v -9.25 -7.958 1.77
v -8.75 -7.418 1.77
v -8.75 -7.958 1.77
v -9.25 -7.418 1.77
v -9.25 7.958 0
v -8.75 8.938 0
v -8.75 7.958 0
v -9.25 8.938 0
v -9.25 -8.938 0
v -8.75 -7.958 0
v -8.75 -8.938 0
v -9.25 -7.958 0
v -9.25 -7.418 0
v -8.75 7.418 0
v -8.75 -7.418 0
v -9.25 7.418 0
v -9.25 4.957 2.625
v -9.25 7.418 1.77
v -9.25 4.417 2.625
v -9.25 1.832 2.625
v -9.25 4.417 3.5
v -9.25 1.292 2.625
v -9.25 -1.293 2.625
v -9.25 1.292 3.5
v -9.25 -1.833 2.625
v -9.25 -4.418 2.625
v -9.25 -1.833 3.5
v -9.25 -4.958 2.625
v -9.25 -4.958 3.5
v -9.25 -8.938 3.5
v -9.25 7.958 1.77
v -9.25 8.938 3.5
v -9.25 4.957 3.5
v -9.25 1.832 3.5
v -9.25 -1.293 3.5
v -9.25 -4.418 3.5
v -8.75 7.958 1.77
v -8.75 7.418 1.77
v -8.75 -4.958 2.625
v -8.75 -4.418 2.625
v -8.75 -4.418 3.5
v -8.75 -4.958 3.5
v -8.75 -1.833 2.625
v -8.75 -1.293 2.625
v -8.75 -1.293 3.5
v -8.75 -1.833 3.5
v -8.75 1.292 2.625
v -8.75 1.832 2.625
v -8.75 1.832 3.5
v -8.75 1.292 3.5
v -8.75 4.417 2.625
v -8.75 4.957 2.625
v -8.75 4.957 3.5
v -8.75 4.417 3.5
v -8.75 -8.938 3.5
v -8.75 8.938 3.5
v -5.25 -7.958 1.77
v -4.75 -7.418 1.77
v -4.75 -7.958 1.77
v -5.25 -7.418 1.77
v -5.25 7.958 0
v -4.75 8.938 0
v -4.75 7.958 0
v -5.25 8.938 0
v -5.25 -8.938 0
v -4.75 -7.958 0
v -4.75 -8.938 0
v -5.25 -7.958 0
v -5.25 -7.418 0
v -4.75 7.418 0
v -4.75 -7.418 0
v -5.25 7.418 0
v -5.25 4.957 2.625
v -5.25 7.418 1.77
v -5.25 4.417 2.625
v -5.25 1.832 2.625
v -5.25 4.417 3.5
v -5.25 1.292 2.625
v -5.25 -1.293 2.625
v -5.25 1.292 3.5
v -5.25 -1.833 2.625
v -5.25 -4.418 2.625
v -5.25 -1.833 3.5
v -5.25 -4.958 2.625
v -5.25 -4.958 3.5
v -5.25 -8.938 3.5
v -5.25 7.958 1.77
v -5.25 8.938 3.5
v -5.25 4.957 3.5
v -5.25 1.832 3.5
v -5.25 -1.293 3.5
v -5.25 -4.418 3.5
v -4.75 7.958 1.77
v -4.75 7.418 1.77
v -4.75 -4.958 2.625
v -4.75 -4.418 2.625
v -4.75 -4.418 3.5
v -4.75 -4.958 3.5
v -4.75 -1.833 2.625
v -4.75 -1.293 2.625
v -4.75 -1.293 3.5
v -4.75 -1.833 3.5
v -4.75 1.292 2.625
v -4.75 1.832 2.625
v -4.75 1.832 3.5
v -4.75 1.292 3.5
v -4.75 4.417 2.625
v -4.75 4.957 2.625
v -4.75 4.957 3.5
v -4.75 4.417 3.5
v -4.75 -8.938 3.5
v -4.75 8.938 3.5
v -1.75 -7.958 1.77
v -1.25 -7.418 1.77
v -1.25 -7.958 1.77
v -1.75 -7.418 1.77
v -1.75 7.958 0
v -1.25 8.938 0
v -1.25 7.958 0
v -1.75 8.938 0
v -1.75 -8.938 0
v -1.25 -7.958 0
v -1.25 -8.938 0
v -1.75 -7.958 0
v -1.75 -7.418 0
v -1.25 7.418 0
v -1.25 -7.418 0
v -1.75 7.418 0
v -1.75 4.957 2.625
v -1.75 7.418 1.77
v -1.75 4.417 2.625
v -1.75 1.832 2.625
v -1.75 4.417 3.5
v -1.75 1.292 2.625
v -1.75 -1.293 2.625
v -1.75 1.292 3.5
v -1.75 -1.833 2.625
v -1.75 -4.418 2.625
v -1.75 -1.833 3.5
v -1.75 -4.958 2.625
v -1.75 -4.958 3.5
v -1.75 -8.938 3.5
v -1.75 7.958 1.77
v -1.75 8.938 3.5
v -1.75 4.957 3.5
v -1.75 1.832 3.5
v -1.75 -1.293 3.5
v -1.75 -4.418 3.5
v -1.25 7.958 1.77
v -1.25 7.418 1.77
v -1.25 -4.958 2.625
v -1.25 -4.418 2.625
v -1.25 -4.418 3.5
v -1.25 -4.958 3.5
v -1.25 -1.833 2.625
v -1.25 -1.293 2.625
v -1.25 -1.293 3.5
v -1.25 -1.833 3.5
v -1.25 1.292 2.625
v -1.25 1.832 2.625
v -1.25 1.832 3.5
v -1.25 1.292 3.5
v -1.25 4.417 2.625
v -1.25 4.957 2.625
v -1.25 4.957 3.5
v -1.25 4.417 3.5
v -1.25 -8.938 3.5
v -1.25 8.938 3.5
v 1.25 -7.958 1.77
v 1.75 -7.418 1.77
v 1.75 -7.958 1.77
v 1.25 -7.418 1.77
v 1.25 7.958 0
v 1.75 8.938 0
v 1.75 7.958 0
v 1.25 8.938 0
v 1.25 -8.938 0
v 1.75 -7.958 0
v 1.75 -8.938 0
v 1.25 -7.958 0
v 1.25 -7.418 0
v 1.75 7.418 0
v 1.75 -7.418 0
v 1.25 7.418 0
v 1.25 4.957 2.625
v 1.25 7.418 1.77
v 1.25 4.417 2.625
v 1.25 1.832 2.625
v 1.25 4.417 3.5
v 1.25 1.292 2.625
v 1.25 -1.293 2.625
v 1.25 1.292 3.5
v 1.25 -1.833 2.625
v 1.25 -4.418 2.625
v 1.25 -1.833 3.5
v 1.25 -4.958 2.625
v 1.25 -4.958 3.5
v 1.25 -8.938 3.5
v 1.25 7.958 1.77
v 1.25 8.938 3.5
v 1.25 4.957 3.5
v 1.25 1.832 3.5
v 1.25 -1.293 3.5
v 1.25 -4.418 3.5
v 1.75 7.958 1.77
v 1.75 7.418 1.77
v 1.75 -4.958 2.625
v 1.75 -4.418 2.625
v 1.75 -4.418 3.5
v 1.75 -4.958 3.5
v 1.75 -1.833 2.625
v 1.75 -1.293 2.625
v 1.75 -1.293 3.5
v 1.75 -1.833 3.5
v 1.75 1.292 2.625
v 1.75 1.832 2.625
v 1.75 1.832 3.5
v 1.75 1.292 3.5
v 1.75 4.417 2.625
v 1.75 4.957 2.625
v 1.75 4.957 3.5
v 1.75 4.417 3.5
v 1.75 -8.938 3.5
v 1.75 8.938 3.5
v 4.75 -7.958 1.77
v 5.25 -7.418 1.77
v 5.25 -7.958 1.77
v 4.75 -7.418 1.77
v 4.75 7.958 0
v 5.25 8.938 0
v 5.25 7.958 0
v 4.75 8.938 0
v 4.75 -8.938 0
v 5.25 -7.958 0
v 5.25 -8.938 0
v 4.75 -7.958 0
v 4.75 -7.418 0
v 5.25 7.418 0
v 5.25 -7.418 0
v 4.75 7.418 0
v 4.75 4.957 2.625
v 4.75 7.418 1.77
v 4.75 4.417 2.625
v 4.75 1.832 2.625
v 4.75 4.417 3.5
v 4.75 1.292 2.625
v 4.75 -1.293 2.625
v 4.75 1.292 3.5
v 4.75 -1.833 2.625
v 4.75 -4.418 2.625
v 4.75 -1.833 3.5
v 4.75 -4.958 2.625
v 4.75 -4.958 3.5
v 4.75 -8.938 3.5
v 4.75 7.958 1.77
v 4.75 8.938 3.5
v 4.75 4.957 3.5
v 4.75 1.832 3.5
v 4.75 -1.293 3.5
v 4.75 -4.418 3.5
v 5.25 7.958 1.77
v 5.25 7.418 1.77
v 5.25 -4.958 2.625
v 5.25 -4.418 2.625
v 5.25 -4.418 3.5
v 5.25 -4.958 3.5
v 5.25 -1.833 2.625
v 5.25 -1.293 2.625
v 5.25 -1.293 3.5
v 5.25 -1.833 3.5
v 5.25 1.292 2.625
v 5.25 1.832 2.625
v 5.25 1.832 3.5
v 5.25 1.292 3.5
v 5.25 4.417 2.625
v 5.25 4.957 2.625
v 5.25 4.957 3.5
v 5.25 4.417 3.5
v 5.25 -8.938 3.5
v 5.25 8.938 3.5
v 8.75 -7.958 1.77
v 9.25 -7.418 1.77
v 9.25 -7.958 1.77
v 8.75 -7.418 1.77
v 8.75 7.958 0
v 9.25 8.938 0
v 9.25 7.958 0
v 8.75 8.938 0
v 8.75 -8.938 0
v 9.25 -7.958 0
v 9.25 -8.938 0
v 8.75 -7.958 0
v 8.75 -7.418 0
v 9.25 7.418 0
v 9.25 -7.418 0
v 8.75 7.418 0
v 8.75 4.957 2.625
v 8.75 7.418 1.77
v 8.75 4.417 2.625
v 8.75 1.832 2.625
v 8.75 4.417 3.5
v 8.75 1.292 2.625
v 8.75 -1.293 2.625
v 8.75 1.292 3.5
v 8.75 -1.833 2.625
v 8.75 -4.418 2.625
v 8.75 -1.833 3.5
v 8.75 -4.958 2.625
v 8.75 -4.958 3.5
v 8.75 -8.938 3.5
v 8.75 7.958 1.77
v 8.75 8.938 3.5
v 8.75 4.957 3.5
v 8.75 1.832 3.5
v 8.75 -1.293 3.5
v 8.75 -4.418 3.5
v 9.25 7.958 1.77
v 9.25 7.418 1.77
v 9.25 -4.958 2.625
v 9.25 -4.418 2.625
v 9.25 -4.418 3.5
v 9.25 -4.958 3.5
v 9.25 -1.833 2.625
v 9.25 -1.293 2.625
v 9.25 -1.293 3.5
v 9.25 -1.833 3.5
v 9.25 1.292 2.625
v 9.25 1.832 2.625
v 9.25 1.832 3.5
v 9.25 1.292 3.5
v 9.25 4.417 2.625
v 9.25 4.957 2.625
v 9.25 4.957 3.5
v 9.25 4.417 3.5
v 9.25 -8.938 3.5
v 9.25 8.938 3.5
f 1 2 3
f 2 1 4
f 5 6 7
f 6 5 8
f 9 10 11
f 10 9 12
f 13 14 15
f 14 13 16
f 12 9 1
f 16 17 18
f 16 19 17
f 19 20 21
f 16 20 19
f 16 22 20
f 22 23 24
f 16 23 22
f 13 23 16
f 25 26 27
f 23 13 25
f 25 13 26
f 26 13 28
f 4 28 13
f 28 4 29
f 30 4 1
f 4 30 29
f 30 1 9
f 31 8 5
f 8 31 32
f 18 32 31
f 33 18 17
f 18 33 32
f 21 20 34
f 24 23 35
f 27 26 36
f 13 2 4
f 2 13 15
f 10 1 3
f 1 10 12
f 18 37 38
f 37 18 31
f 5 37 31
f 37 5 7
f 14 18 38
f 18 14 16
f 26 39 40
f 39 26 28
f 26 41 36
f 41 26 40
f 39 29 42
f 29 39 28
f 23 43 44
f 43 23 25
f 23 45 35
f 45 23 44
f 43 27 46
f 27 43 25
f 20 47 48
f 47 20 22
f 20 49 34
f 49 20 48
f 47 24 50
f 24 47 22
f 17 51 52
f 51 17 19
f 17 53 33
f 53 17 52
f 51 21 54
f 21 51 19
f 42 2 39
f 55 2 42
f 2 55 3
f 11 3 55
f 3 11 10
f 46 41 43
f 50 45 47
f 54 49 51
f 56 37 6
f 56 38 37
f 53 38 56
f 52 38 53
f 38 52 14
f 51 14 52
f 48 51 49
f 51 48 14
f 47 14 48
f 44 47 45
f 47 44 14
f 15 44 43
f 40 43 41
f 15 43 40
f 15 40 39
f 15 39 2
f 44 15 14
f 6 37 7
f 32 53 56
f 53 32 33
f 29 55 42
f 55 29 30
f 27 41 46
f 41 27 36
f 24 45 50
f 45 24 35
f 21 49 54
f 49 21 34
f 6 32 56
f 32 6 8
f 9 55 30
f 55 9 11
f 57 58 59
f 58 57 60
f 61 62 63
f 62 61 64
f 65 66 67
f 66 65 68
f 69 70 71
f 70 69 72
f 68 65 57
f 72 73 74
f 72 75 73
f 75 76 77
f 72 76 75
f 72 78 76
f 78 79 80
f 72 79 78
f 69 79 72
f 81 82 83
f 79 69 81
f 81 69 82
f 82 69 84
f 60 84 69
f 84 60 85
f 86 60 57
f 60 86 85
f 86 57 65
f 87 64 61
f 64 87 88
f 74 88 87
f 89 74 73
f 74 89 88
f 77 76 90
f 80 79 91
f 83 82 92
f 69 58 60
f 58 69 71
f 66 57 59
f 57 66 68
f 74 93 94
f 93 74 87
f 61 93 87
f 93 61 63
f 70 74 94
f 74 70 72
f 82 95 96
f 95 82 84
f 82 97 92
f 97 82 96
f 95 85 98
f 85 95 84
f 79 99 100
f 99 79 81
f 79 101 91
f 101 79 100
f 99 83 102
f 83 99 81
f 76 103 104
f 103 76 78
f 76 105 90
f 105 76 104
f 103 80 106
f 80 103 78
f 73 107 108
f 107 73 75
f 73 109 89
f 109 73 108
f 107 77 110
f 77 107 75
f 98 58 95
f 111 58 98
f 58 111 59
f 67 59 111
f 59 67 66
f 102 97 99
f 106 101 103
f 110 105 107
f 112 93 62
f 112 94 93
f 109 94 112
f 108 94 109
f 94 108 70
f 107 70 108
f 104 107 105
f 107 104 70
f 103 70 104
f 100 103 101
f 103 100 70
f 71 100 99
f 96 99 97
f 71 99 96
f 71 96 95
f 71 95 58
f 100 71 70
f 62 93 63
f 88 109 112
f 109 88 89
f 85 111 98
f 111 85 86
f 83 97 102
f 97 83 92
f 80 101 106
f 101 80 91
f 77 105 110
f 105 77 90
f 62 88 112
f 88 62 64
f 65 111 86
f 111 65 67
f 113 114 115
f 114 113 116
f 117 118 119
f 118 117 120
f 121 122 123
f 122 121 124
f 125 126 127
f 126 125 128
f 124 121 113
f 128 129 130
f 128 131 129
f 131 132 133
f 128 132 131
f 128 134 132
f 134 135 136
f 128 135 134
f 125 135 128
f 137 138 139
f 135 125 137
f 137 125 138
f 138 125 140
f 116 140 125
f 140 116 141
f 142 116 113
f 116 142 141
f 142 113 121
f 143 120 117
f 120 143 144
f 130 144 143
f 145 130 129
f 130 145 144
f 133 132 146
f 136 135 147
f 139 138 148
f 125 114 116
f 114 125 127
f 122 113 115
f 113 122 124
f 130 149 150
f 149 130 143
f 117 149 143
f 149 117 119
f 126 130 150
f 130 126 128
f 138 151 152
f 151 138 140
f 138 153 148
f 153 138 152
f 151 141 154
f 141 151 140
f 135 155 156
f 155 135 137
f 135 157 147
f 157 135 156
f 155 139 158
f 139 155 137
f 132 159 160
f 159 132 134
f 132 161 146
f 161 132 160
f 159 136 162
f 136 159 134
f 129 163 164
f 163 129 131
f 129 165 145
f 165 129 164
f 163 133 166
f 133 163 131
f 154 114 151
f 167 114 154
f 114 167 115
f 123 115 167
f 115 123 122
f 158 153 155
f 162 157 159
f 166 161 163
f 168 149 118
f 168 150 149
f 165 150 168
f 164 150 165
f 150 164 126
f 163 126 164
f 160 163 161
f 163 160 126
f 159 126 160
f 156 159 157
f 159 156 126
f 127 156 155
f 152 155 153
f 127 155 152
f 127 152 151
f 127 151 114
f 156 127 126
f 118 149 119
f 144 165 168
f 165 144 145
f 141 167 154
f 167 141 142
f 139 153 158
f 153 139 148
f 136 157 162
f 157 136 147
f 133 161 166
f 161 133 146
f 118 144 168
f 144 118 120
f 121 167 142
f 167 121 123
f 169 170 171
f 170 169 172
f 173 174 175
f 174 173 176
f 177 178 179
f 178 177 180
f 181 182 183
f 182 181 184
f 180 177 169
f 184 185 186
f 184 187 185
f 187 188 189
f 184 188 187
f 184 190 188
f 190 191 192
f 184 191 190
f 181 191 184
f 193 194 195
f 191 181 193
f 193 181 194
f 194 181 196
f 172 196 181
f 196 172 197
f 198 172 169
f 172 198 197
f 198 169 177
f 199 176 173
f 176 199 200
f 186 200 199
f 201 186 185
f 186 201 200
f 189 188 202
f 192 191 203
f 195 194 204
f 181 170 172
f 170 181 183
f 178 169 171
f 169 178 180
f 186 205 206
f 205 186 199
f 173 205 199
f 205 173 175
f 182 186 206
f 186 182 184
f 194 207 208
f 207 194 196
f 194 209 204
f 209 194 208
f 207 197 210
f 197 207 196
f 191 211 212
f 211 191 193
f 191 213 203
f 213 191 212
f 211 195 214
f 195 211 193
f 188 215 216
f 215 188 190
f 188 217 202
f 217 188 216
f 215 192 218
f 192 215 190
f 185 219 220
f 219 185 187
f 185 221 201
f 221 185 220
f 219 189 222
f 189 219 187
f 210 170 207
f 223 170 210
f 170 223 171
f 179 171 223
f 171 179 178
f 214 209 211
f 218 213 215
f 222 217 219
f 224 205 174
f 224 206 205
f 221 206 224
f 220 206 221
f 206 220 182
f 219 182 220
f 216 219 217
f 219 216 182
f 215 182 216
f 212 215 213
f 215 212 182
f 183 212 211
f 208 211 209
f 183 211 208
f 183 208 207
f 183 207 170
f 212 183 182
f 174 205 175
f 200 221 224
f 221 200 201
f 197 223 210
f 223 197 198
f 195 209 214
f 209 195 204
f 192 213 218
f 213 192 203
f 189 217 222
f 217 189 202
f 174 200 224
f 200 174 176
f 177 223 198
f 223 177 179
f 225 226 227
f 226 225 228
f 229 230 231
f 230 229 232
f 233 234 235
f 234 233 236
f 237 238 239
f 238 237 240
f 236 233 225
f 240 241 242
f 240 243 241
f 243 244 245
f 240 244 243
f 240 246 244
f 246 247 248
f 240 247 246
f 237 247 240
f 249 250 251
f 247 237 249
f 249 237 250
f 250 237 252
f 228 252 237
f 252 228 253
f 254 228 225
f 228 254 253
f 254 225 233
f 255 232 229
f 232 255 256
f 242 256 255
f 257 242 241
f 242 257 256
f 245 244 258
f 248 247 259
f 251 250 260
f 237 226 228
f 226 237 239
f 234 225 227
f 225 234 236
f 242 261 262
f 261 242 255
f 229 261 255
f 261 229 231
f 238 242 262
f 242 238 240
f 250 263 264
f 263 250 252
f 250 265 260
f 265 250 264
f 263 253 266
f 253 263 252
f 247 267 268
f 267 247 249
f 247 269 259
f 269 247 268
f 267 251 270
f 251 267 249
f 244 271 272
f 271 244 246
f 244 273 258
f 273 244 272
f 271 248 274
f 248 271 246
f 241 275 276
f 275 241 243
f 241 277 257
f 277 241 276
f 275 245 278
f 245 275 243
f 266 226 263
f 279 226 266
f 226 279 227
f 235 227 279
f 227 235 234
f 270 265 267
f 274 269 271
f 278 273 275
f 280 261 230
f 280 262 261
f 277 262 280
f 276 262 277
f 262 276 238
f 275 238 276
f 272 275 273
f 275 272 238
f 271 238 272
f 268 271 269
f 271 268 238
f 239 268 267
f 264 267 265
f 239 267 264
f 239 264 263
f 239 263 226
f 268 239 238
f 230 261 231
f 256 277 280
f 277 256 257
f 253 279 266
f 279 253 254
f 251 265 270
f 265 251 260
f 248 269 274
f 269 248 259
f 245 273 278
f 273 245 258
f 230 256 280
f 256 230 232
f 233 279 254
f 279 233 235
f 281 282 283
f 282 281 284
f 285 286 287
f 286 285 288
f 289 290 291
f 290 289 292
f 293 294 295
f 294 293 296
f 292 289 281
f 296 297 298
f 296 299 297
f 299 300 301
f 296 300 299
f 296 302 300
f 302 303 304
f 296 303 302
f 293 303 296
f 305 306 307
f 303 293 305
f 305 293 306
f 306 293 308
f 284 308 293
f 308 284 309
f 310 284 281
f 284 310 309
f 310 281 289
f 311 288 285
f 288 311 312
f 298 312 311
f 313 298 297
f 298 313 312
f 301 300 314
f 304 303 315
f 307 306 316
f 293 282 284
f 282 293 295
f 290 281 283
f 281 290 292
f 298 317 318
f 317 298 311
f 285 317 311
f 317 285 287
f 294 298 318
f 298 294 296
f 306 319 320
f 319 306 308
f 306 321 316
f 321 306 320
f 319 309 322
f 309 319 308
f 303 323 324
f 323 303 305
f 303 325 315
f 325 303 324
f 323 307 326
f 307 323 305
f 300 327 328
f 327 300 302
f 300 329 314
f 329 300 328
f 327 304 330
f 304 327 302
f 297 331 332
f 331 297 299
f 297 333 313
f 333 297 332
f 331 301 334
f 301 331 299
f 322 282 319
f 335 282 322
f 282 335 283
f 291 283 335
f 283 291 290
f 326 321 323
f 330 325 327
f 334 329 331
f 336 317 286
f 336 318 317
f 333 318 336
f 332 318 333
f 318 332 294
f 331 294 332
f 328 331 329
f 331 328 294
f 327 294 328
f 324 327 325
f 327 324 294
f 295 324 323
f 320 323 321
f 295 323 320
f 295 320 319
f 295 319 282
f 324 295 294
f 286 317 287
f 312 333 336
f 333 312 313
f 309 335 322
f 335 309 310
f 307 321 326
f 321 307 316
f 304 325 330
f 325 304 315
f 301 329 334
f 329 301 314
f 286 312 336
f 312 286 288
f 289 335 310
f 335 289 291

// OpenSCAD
// file: layout.scad
// Rack layout geometry. Include config.scad once before this file.
// Functions are ordered so each name is defined before use (OpenSCAD 2021).

function rack_center_x() = 0;
function rack_center_y() = 0;

function x_divider_center_x(i) =
  rack_center_x() + divider_offset_from_center_in[i];

function divider_inner_left_x() =
  x_divider_center_x(0) + wall_thickness_in / 2;
function divider_inner_right_x() =
  x_divider_center_x(num_rows) - wall_thickness_in / 2;

function end_wall_inner_front_y() =
  rack_center_y() + end_wall_inner_offset_from_center_y[0];
function end_wall_inner_back_y() =
  rack_center_y() + end_wall_inner_offset_from_center_y[1];

function footprint_d_in() = max(
  end_wall_inner_back_y() - end_wall_inner_front_y(),
  (tubes_per_row - 1) * row_depth_in + tube_od_in
);

function layout_half_span_in() =
  max(
    max([for (i = [0 : num_rows - 1]) abs(column_tube_offset_from_center_in[i])])
      + tube_od_in / 2,
    max([for (i = [0 : num_rows]) abs(divider_offset_from_center_in[i])])
      + wall_thickness_in / 2
  );

function end_wall_w_in() =
  x_divider_center_x(num_rows) - x_divider_center_x(0) + wall_thickness_in
    + 2 * end_wall_extension_in;
function end_wall_x0() =
  x_divider_center_x(0) - wall_thickness_in / 2 - end_wall_extension_in;
function end_wall_height_in() = wall_height_in;

function tube_center_y(col_i) =
  rack_center_y() + depth_tube_offset_from_center_in[col_i];

function column_board_length_in() = footprint_d_in() + column_board_extension_in;
function column_board_y0() =
  rack_center_y() - column_board_length_in() / 2;
function board_half_lap_z_in() = wall_height_in / 2;

function num_middle_row_dividers() = tubes_per_row - 1;

function middle_row_divider_center_y(i) =
  rack_center_y()
    + (depth_tube_offset_from_center_in[i]
      + depth_tube_offset_from_center_in[i + 1])
      / 2;

function middle_row_z0_in() = board_half_lap_z_in();
function middle_row_height_in() = wall_height_in;
function middle_row_half_lap_z_in() = middle_row_height_in() / 2;
// Lap in the column upper band (overlap with column is only wall_height - z0).
function column_middle_row_notch_z0() =
  middle_row_z0_in() + (wall_height_in - middle_row_z0_in()) / 2;
function column_middle_row_notch_h_in() =
  (wall_height_in - middle_row_z0_in()) / 2;
function row_board_middle_w_in() = end_wall_w_in();
function row_board_middle_x0() = end_wall_x0();

function footprint_w_in() = max(
  divider_inner_right_x() - divider_inner_left_x(),
  2 * (layout_half_span_in() + tilt_pad_x_in)
);

function bay_center_x(row_i) =
  rack_center_x() + column_tube_offset_from_center_in[row_i];

function divider_clear_span_x(bay_i) =
  divider_offset_from_center_in[bay_i + 1]
    - divider_offset_from_center_in[bay_i]
    - wall_thickness_in;

// --- Top dowels (middle + inner primitives; rack.scad places num_row_dowels_top copies) ---
function dowel_layer_z0_in() =
  middle_row_z0_in() + middle_row_height_in() + dowel_above_middle_row_in;

function row_dowel_length_y_in() = column_board_length_in();

function row_dowel_od_at(i) = row_dowel_od_in[i];

function row_dowel_center_z_in(i) = dowel_layer_z0_in() + row_dowel_od_at(i) / 2;

function row_dowel_placement_x(i) =
  rack_center_x() + row_dowel_x_offset_from_center_in[i];

function row_dowel_tube_column(i) = row_dowel_tube_column_i[i];
// file: config.scad
// Finale mortar rack — shared parameters (inches unless noted)

// --- Tubes (inventory) ---
tube_od_in = 2.375;
tube_length_in = 12;
shell_nominal_in = 2; // Class C 2 in. mortars

// --- Layout ---
num_rows = 5;
tubes_per_row = 5; // 5×5 per rack × 2 racks = 50 tubes (Commander finale)
num_dividers_x = num_rows + 1; // 6 green boards: left side + 4 between columns + right side
board_thickness_in = 0.5;
tube_gap_in = 0.25; // extra clearance inside each cell
row_spacing_in = tube_od_in + board_thickness_in + tube_gap_in;
row_depth_in = tube_od_in + board_thickness_in + tube_gap_in;

// --- Column layout (+X = right, from rack center) ---
column_tube_offset_from_center_in = [
  -6.5, // 0 outer left
  -3, // 1 middle left
  0,      // 2 center
  3,  // 3 middle right
  6.5,  // 4 outer right
];
divider_offset_from_center_in = [
  -9,     // 0 left side (outer)
  -5,     // 1 outer left | middle left
  -1.5,   // 2 middle left | center
  1.5,    // 3 center | middle right
  5,      // 4 middle right | outer right
  9,      // 5 right side (outer)
];

// --- Depth layout (+Y = toward back, from rack center) ---
depth_tube_offset_from_center_in = [
  -6.25, // 0 front
  -3.125,
  0,     // 2 center
  3.125,
  6.25,  // 4 back
];
end_wall_inner_offset_from_center_y = [
  -7.438, // front inner face
  7.438,  // back inner face
];

column_board_extension_in = 3; // +length along Y total (1-1/2 in. each end), centered on rack Y
end_wall_extension_in = 1; // brown ends: +1 in. per side in X (panel plane)
column_end_half_lap = true; // half-lap: columns lose bottom half, rows lose top half
middle_row_half_lap = true; // mid-height row dividers: bottom half out; columns lose top of upper half

// --- Top dowels (four cylinders along +Y, centered on rack Y) ---
num_row_dowels_top = 4;
row_dowel_x_offset_from_center_in = [
  -6,     // 0 inside outer-left column (bay 0)
  -2,  // 1 outside middle column, left (bay 1)
  2,   // 2 outside middle column, right (bay 3)
  6,      // 3 inside outer-right column (bay 4)
];
row_dowel_bay_i = [0, 1, 3, 4]; // green-column bay per dowel (for OD)
row_dowel_tube_column_i = [0, 1, 3, 4]; // tubes to subtract per dowel
dowel_above_middle_row_in = 1; // bottom of dowel sits this far above row-board-middle top
row_dowel_od_middle_in = 2;   // ±6 in. X (bay 0 / 4)
row_dowel_od_inner_in = 1.5;  // ±2 in. X (bay 1 / 3)
row_dowel_middle_i = [0, 3];
row_dowel_inner_i = [1, 2];
// OD per dowel index: [middle-L, inner-L, inner-R, middle-R]
row_dowel_od_in = [
  row_dowel_od_middle_in,
  row_dowel_od_inner_in,
  row_dowel_od_inner_in,
  row_dowel_od_middle_in,
];
dowel_fit_clearance_in = 0.125; // used when auto-sizing OD from bay span
center_tube_column_i = 2; // middle tube column (0..num_rows-1)

// --- Angles (degrees from vertical; left negative, right positive) ---
outer_angle_deg = 12;

function row_offset(i) = i - floor(num_rows / 2); // -2 .. +2 for 5 rows
function sign(x) = x < 0 ? -1 : (x > 0 ? 1 : 0);
function row_angle_deg(i) =
  let (o = row_offset(i))
  o == 0 ? 0 : sign(o) * outer_angle_deg * abs(o) / 2;

tilt_pad_x_in = tube_length_in * sin(outer_angle_deg) + tube_gap_in;

// --- Structure (1/2 in. plywood walls only) ---
wall_thickness_in = 0.5;
wall_height_in = 3.5; // row boards + column boards (same height)

color_wall_end = [0.90, 0.62, 0.38];
color_wall_side = [0.58, 0.72, 0.42];
color_middle_row = [0.45, 0.55, 0.85];
color_dowel_middle = [0.85, 0.75, 0.35];
color_dowel_standard = [0.75, 0.55, 0.25];
color_tube = [0.25, 0.45, 0.85, 0.85];

// --- Preview ---
preview = true;
$fn = preview ? 24 : 72;
show_tubes = true;
show_walls = true; // brown front/back ends
show_x_column_boards = true; // six green dividers along +X
show_middle_row_boards = true; // four mid-height row dividers (between tube rows along Y)
show_row_dowels_top = true; // dowels along Y between column boards
// main file
// Green column dividers — open this file directly to preview.
include <config.scad>
include <layout.scad>

module column_board_bottom(x_center) {
  lap = board_half_lap_z_in();
  mid_notch_z0 = column_middle_row_notch_z0();
  mid_notch_h = column_middle_row_notch_h_in();
  eps = 0.02;
  oy_front = end_wall_inner_front_y() - wall_thickness_in;
  oy_back = end_wall_inner_back_y();
  y0b = column_board_y0();
  color(color_wall_side)
    translate([x_center - wall_thickness_in / 2, y0b, 0])
      difference() {
        cube([
          wall_thickness_in,
          column_board_length_in(),
          wall_height_in
        ]);
        if (column_end_half_lap) {
          translate([0, oy_front - y0b - eps, 0])
            cube([
              wall_thickness_in + 2 * eps,
              wall_thickness_in + 2 * eps,
              lap + eps
            ]);
          translate([0, oy_back - y0b - eps, 0])
            cube([
              wall_thickness_in + 2 * eps,
              wall_thickness_in + 2 * eps,
              lap + eps
            ]);
        }
        if (middle_row_half_lap)
          for (m = [0 : num_middle_row_dividers() - 1])
            translate([
              0,
              middle_row_divider_center_y(m) - y0b - wall_thickness_in / 2 - eps,
              mid_notch_z0
            ])
              cube([
                wall_thickness_in + 2 * eps,
                wall_thickness_in + 2 * eps,
                mid_notch_h + eps
              ]);
      }
}

module column_boards_bottom() {
  for (i = [0 : num_rows])
    column_board_bottom(x_divider_center_x(i));
}

column_boards_bottom();
